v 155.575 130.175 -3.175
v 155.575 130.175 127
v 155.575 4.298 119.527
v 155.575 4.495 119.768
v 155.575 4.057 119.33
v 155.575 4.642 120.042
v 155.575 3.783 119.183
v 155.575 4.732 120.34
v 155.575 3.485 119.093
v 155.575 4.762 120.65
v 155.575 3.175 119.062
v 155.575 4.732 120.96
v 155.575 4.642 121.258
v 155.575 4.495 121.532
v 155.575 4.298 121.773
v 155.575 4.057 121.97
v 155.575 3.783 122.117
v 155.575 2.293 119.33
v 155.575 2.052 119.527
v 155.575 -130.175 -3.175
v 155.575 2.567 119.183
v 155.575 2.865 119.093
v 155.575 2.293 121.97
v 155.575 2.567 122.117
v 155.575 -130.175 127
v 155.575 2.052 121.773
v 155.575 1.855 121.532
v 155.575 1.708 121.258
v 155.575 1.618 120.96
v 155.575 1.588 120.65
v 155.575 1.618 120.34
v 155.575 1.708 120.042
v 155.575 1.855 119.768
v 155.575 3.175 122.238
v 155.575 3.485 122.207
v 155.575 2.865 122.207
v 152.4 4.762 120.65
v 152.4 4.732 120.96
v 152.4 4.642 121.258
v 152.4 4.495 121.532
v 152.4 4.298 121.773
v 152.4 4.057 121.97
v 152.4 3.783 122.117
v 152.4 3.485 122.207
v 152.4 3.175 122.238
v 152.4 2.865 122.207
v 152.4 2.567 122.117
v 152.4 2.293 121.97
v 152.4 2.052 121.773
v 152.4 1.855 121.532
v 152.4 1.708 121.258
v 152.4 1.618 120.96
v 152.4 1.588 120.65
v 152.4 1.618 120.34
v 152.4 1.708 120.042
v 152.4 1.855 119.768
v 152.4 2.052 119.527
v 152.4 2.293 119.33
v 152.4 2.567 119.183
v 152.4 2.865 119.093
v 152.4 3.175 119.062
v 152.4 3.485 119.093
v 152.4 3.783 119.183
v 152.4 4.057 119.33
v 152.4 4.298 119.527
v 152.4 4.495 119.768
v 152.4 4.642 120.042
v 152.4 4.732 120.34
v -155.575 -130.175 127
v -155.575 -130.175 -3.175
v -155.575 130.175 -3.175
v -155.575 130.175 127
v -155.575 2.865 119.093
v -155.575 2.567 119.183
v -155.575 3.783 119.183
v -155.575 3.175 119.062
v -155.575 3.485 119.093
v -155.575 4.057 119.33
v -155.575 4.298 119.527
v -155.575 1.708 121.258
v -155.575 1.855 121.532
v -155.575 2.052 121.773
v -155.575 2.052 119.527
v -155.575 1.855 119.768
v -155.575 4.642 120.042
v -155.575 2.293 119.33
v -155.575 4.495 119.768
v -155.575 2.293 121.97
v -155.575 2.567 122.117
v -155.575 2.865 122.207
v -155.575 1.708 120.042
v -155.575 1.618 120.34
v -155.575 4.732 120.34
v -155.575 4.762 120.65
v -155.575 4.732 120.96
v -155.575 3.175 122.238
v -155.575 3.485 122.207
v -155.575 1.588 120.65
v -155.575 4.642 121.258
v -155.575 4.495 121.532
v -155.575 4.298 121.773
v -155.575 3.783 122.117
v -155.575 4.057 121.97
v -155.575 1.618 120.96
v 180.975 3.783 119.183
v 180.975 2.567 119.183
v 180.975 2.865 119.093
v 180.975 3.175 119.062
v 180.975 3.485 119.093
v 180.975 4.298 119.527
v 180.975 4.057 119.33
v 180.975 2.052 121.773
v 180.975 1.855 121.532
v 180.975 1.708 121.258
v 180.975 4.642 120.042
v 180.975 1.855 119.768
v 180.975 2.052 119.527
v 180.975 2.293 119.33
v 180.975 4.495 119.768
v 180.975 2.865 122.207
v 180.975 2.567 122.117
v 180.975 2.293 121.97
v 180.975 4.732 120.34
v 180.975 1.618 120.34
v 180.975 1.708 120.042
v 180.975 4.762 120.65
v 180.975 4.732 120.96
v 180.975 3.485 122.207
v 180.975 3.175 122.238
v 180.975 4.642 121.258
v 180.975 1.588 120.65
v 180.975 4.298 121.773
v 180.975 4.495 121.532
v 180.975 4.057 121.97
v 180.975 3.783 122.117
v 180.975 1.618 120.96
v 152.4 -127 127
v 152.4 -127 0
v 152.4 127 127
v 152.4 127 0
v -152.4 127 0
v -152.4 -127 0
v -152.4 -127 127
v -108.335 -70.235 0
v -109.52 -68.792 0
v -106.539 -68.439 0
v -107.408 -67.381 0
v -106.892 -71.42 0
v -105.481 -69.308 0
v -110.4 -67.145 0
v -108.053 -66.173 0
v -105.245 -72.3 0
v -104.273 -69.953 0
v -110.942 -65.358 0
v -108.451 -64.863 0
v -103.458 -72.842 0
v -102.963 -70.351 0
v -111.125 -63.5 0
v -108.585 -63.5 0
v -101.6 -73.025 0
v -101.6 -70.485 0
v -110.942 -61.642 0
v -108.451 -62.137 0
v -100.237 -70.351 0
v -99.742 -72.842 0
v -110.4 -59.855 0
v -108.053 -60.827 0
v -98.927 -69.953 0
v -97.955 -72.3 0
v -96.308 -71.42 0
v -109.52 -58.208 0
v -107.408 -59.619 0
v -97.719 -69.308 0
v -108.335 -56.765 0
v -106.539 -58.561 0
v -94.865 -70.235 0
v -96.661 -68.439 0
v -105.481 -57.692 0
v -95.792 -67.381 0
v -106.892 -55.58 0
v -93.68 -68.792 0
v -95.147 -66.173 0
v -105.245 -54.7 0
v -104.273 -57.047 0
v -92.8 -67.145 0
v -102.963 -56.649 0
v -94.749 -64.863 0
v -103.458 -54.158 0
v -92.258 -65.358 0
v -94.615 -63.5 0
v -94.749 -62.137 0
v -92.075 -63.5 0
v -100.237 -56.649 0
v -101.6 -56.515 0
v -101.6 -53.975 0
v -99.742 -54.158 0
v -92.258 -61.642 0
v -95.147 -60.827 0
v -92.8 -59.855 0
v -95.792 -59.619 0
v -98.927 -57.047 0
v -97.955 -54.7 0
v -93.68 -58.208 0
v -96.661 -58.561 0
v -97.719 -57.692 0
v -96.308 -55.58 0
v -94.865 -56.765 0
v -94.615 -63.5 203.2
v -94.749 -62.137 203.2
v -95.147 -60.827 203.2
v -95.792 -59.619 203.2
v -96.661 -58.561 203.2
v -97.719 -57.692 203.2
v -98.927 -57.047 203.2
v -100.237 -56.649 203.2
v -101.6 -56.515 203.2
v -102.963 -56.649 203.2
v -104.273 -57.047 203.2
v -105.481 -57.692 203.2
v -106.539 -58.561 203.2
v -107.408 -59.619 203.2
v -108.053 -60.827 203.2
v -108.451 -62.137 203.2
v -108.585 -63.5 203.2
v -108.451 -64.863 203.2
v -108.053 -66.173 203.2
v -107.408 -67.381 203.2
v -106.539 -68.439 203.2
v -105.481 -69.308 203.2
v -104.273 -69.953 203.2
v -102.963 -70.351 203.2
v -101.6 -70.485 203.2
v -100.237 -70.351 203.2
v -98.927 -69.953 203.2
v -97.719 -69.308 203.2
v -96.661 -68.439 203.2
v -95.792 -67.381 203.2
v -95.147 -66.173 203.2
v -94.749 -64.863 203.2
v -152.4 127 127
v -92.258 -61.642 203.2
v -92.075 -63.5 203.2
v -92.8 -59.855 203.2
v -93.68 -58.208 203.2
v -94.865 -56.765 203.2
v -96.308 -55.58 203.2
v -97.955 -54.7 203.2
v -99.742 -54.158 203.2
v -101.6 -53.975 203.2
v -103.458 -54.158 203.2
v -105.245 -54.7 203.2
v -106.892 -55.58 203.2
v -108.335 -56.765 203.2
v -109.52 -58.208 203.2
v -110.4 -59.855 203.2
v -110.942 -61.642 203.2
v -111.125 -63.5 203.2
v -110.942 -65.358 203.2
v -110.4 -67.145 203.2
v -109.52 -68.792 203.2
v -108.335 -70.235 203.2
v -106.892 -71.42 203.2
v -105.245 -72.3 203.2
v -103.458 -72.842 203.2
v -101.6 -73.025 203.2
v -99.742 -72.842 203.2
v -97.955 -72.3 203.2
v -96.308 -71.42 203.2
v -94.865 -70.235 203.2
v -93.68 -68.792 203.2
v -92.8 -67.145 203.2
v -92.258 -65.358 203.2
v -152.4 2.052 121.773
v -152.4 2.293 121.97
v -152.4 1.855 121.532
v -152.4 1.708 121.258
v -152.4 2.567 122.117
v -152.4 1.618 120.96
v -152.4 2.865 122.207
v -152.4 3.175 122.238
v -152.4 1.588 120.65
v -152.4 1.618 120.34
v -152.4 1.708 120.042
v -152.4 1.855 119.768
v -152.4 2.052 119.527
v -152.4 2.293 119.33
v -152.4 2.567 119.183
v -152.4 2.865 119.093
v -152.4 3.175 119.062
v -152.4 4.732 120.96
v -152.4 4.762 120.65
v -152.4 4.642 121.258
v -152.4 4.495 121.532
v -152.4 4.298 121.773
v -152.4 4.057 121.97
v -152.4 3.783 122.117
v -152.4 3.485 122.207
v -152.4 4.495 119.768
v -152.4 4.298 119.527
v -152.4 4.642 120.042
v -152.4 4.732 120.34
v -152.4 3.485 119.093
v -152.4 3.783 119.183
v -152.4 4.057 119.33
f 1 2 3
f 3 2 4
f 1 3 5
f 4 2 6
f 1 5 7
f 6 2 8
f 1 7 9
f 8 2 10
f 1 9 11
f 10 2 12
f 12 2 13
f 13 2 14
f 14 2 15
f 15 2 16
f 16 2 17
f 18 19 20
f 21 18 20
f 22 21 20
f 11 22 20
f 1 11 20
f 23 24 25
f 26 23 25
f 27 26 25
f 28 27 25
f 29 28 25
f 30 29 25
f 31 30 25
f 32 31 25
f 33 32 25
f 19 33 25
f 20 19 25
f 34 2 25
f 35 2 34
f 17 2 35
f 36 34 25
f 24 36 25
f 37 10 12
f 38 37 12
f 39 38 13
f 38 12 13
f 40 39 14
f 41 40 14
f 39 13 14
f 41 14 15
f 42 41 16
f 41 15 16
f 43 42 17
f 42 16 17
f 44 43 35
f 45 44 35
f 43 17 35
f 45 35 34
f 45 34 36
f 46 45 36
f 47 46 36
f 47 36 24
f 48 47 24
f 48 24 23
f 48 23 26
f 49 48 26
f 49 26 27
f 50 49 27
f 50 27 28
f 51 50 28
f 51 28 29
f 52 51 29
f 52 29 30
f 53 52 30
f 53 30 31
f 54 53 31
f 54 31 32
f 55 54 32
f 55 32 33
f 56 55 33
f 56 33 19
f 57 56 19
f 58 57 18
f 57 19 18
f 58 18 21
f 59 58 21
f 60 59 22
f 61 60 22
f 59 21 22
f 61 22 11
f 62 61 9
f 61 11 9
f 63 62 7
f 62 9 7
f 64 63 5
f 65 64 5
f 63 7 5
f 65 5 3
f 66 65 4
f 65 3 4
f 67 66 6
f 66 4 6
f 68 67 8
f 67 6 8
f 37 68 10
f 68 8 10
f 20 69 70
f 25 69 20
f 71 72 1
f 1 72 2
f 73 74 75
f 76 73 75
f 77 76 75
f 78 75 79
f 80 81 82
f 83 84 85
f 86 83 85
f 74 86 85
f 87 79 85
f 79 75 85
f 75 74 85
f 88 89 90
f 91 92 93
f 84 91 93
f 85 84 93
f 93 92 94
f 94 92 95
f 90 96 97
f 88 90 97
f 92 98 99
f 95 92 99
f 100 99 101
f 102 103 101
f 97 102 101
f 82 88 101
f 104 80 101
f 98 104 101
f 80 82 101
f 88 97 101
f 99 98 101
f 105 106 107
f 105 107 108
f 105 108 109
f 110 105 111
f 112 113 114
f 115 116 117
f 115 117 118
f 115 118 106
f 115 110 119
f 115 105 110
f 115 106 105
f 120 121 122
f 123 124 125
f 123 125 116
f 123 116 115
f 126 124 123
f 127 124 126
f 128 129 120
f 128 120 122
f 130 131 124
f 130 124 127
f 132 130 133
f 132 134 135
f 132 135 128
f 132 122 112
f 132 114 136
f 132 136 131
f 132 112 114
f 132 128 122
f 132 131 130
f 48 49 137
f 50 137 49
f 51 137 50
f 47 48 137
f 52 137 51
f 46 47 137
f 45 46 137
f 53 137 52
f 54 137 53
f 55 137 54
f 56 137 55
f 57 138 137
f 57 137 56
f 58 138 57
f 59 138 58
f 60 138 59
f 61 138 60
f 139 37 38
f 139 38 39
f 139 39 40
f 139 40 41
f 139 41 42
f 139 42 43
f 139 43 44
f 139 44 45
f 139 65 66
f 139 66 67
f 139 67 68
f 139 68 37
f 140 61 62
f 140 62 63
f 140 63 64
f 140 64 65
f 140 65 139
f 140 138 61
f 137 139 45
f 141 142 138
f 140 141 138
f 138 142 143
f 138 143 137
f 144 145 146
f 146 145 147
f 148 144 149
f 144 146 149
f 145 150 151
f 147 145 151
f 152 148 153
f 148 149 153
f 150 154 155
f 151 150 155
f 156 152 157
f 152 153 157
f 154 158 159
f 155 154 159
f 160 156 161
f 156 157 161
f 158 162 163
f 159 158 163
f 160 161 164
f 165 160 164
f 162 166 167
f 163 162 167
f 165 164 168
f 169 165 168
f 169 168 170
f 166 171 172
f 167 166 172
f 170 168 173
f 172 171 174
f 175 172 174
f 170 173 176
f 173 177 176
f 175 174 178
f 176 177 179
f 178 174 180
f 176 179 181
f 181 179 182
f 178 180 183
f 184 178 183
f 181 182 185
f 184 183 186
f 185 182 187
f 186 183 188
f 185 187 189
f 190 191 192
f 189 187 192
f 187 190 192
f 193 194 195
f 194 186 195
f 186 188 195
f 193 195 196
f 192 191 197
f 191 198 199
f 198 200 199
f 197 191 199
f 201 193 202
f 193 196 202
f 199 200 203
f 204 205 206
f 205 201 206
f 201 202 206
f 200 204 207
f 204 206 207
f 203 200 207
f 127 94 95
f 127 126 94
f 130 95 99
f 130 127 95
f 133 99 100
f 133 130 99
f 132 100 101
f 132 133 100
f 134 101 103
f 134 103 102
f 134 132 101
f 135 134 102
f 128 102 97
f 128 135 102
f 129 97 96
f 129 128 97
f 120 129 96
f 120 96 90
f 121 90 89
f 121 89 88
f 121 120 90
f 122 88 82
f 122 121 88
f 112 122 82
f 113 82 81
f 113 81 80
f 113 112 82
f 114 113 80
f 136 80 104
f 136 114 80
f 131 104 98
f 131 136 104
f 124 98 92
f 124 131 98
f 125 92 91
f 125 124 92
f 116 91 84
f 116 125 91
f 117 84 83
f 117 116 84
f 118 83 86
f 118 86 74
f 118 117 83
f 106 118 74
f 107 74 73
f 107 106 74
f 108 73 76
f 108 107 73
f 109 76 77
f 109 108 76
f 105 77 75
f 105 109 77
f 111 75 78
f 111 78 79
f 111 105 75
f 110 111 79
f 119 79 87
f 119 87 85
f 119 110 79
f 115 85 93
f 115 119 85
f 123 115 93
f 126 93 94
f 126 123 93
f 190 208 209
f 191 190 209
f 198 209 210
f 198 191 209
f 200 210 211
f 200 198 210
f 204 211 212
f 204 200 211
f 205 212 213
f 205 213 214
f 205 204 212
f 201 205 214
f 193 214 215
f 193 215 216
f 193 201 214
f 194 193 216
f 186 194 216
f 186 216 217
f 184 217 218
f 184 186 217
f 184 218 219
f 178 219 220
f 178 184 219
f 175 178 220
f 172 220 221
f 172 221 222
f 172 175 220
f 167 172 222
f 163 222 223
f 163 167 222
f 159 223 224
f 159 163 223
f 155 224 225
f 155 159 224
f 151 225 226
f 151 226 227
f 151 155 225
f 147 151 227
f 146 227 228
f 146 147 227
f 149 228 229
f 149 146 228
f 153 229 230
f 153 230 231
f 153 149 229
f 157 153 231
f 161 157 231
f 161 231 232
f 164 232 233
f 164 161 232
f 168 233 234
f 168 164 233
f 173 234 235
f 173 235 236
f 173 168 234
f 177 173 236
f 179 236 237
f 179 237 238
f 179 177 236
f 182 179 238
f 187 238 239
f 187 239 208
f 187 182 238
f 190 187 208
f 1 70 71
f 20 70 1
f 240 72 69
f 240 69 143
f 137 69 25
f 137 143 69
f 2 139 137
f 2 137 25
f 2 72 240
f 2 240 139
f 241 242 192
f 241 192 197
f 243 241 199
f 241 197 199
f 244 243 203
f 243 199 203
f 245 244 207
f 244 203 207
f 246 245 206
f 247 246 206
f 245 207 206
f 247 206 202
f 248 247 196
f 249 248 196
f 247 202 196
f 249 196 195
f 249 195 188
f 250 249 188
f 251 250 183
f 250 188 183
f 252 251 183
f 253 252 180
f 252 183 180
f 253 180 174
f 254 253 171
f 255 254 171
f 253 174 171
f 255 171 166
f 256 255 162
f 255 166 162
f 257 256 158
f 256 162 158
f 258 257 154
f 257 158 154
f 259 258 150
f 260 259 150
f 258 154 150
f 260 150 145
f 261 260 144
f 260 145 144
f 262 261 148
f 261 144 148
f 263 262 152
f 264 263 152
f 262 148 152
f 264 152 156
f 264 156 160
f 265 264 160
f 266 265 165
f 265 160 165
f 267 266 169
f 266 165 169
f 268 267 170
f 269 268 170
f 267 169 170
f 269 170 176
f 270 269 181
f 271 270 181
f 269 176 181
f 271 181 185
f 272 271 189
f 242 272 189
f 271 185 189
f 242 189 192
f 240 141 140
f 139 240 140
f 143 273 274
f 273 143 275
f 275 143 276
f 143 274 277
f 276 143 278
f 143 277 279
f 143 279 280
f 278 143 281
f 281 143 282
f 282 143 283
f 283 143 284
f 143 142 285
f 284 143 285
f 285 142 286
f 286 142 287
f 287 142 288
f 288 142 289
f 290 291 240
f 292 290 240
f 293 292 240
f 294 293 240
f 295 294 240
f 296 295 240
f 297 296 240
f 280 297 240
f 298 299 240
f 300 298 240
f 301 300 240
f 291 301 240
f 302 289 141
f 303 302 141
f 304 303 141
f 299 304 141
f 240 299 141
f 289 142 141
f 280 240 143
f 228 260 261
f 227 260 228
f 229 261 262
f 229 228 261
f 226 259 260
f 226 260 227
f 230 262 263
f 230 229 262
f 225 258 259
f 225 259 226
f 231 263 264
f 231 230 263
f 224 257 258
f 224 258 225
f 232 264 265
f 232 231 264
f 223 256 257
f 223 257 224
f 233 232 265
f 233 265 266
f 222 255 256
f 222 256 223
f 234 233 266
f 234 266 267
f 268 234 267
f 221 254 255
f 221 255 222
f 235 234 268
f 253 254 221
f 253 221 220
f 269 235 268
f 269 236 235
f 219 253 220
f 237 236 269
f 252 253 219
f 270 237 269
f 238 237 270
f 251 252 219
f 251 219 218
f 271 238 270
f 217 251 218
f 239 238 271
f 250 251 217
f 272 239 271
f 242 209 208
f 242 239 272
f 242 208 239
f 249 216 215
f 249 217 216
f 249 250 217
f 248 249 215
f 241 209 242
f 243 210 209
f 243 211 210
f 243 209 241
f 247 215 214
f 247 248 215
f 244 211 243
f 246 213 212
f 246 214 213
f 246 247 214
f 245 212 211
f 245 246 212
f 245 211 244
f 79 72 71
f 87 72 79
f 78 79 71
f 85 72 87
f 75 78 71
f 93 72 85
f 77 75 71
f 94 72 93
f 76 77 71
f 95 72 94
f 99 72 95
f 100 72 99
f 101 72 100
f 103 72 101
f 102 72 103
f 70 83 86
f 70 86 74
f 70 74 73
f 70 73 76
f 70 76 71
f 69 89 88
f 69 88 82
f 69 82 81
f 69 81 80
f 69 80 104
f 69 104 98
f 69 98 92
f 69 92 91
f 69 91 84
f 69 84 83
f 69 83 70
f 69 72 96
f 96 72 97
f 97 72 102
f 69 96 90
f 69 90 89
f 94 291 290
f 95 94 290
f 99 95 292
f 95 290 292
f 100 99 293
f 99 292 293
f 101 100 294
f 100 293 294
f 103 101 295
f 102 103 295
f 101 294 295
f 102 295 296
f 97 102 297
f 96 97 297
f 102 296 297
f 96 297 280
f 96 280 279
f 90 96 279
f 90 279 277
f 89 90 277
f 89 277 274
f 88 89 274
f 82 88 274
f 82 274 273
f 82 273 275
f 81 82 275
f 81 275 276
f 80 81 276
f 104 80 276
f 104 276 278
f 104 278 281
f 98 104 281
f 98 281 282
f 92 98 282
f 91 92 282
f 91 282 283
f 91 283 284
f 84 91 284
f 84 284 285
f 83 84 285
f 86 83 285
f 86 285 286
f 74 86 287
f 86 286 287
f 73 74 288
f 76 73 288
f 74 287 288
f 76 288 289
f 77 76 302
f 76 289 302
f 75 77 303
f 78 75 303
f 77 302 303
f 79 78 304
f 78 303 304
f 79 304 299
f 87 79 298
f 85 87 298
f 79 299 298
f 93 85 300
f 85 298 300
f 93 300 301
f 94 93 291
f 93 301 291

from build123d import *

# Parameters (mm, degrees)
F0_W          = 311.15
F0_H          = 260.35
F0_W_2        = 304.8
F0_H_2        = 254
F1_DEPTH      = 127
F2_W          = 311.15
F2_H          = 260.35
F3_DEPTH      = 3.175
F5_R          = 1.5875
F6_DEPTH      = 311.151
F7_R          = 1.5875
F8_DEPTH      = 25.4
F8_DEPTH_BACK = 311.15
F4_R          = 9.525
F4_R_2        = 6.985
F9_DEPTH      = 203.2


with BuildPart() as f1:
    # F0 (on Top) → F1 (new body)
    with BuildSketch(Plane.XY):
        Rectangle(F0_W, F0_H)
        Rectangle(F0_W_2, F0_H_2, mode=Mode.SUBTRACT)
    extrude(amount=F1_DEPTH)

    # F2 (on face) → F3 (join)
    with BuildSketch(Plane(origin=(0, 0, 0), x_dir=(1, 0, 0), z_dir=(0, 0, -1))):
        Rectangle(F2_W, F2_H)
    extrude(amount=F3_DEPTH)

    # F5 (on face) → F6 (cut, through all)
    with BuildSketch(Plane.YZ.offset(155.575)):
        with Locations((3.175, 120.65)):
            Circle(F5_R)
    extrude(amount=-F6_DEPTH, mode=Mode.SUBTRACT)


with BuildPart() as f8:
    # F7 (on face) → F8 (new body, two sides)
    with BuildSketch(Plane.YZ.offset(155.575)) as f8_sk:
        with Locations((3.175, 120.65)):
            Circle(F7_R)
    extrude(amount=F8_DEPTH)
    extrude(f8_sk.sketch, amount=-F8_DEPTH_BACK)


with BuildPart() as f9:
    # F4 (on face) → F9 (new body)
    with BuildSketch(Plane.XY):
        with Locations((-101.6, -63.5)):
            Circle(F4_R)
        with Locations((-101.6, -63.5)):
            Circle(F4_R_2, mode=Mode.SUBTRACT)
    extrude(amount=F9_DEPTH)


solid = Compound([f1.part, f8.part, f9.part])
